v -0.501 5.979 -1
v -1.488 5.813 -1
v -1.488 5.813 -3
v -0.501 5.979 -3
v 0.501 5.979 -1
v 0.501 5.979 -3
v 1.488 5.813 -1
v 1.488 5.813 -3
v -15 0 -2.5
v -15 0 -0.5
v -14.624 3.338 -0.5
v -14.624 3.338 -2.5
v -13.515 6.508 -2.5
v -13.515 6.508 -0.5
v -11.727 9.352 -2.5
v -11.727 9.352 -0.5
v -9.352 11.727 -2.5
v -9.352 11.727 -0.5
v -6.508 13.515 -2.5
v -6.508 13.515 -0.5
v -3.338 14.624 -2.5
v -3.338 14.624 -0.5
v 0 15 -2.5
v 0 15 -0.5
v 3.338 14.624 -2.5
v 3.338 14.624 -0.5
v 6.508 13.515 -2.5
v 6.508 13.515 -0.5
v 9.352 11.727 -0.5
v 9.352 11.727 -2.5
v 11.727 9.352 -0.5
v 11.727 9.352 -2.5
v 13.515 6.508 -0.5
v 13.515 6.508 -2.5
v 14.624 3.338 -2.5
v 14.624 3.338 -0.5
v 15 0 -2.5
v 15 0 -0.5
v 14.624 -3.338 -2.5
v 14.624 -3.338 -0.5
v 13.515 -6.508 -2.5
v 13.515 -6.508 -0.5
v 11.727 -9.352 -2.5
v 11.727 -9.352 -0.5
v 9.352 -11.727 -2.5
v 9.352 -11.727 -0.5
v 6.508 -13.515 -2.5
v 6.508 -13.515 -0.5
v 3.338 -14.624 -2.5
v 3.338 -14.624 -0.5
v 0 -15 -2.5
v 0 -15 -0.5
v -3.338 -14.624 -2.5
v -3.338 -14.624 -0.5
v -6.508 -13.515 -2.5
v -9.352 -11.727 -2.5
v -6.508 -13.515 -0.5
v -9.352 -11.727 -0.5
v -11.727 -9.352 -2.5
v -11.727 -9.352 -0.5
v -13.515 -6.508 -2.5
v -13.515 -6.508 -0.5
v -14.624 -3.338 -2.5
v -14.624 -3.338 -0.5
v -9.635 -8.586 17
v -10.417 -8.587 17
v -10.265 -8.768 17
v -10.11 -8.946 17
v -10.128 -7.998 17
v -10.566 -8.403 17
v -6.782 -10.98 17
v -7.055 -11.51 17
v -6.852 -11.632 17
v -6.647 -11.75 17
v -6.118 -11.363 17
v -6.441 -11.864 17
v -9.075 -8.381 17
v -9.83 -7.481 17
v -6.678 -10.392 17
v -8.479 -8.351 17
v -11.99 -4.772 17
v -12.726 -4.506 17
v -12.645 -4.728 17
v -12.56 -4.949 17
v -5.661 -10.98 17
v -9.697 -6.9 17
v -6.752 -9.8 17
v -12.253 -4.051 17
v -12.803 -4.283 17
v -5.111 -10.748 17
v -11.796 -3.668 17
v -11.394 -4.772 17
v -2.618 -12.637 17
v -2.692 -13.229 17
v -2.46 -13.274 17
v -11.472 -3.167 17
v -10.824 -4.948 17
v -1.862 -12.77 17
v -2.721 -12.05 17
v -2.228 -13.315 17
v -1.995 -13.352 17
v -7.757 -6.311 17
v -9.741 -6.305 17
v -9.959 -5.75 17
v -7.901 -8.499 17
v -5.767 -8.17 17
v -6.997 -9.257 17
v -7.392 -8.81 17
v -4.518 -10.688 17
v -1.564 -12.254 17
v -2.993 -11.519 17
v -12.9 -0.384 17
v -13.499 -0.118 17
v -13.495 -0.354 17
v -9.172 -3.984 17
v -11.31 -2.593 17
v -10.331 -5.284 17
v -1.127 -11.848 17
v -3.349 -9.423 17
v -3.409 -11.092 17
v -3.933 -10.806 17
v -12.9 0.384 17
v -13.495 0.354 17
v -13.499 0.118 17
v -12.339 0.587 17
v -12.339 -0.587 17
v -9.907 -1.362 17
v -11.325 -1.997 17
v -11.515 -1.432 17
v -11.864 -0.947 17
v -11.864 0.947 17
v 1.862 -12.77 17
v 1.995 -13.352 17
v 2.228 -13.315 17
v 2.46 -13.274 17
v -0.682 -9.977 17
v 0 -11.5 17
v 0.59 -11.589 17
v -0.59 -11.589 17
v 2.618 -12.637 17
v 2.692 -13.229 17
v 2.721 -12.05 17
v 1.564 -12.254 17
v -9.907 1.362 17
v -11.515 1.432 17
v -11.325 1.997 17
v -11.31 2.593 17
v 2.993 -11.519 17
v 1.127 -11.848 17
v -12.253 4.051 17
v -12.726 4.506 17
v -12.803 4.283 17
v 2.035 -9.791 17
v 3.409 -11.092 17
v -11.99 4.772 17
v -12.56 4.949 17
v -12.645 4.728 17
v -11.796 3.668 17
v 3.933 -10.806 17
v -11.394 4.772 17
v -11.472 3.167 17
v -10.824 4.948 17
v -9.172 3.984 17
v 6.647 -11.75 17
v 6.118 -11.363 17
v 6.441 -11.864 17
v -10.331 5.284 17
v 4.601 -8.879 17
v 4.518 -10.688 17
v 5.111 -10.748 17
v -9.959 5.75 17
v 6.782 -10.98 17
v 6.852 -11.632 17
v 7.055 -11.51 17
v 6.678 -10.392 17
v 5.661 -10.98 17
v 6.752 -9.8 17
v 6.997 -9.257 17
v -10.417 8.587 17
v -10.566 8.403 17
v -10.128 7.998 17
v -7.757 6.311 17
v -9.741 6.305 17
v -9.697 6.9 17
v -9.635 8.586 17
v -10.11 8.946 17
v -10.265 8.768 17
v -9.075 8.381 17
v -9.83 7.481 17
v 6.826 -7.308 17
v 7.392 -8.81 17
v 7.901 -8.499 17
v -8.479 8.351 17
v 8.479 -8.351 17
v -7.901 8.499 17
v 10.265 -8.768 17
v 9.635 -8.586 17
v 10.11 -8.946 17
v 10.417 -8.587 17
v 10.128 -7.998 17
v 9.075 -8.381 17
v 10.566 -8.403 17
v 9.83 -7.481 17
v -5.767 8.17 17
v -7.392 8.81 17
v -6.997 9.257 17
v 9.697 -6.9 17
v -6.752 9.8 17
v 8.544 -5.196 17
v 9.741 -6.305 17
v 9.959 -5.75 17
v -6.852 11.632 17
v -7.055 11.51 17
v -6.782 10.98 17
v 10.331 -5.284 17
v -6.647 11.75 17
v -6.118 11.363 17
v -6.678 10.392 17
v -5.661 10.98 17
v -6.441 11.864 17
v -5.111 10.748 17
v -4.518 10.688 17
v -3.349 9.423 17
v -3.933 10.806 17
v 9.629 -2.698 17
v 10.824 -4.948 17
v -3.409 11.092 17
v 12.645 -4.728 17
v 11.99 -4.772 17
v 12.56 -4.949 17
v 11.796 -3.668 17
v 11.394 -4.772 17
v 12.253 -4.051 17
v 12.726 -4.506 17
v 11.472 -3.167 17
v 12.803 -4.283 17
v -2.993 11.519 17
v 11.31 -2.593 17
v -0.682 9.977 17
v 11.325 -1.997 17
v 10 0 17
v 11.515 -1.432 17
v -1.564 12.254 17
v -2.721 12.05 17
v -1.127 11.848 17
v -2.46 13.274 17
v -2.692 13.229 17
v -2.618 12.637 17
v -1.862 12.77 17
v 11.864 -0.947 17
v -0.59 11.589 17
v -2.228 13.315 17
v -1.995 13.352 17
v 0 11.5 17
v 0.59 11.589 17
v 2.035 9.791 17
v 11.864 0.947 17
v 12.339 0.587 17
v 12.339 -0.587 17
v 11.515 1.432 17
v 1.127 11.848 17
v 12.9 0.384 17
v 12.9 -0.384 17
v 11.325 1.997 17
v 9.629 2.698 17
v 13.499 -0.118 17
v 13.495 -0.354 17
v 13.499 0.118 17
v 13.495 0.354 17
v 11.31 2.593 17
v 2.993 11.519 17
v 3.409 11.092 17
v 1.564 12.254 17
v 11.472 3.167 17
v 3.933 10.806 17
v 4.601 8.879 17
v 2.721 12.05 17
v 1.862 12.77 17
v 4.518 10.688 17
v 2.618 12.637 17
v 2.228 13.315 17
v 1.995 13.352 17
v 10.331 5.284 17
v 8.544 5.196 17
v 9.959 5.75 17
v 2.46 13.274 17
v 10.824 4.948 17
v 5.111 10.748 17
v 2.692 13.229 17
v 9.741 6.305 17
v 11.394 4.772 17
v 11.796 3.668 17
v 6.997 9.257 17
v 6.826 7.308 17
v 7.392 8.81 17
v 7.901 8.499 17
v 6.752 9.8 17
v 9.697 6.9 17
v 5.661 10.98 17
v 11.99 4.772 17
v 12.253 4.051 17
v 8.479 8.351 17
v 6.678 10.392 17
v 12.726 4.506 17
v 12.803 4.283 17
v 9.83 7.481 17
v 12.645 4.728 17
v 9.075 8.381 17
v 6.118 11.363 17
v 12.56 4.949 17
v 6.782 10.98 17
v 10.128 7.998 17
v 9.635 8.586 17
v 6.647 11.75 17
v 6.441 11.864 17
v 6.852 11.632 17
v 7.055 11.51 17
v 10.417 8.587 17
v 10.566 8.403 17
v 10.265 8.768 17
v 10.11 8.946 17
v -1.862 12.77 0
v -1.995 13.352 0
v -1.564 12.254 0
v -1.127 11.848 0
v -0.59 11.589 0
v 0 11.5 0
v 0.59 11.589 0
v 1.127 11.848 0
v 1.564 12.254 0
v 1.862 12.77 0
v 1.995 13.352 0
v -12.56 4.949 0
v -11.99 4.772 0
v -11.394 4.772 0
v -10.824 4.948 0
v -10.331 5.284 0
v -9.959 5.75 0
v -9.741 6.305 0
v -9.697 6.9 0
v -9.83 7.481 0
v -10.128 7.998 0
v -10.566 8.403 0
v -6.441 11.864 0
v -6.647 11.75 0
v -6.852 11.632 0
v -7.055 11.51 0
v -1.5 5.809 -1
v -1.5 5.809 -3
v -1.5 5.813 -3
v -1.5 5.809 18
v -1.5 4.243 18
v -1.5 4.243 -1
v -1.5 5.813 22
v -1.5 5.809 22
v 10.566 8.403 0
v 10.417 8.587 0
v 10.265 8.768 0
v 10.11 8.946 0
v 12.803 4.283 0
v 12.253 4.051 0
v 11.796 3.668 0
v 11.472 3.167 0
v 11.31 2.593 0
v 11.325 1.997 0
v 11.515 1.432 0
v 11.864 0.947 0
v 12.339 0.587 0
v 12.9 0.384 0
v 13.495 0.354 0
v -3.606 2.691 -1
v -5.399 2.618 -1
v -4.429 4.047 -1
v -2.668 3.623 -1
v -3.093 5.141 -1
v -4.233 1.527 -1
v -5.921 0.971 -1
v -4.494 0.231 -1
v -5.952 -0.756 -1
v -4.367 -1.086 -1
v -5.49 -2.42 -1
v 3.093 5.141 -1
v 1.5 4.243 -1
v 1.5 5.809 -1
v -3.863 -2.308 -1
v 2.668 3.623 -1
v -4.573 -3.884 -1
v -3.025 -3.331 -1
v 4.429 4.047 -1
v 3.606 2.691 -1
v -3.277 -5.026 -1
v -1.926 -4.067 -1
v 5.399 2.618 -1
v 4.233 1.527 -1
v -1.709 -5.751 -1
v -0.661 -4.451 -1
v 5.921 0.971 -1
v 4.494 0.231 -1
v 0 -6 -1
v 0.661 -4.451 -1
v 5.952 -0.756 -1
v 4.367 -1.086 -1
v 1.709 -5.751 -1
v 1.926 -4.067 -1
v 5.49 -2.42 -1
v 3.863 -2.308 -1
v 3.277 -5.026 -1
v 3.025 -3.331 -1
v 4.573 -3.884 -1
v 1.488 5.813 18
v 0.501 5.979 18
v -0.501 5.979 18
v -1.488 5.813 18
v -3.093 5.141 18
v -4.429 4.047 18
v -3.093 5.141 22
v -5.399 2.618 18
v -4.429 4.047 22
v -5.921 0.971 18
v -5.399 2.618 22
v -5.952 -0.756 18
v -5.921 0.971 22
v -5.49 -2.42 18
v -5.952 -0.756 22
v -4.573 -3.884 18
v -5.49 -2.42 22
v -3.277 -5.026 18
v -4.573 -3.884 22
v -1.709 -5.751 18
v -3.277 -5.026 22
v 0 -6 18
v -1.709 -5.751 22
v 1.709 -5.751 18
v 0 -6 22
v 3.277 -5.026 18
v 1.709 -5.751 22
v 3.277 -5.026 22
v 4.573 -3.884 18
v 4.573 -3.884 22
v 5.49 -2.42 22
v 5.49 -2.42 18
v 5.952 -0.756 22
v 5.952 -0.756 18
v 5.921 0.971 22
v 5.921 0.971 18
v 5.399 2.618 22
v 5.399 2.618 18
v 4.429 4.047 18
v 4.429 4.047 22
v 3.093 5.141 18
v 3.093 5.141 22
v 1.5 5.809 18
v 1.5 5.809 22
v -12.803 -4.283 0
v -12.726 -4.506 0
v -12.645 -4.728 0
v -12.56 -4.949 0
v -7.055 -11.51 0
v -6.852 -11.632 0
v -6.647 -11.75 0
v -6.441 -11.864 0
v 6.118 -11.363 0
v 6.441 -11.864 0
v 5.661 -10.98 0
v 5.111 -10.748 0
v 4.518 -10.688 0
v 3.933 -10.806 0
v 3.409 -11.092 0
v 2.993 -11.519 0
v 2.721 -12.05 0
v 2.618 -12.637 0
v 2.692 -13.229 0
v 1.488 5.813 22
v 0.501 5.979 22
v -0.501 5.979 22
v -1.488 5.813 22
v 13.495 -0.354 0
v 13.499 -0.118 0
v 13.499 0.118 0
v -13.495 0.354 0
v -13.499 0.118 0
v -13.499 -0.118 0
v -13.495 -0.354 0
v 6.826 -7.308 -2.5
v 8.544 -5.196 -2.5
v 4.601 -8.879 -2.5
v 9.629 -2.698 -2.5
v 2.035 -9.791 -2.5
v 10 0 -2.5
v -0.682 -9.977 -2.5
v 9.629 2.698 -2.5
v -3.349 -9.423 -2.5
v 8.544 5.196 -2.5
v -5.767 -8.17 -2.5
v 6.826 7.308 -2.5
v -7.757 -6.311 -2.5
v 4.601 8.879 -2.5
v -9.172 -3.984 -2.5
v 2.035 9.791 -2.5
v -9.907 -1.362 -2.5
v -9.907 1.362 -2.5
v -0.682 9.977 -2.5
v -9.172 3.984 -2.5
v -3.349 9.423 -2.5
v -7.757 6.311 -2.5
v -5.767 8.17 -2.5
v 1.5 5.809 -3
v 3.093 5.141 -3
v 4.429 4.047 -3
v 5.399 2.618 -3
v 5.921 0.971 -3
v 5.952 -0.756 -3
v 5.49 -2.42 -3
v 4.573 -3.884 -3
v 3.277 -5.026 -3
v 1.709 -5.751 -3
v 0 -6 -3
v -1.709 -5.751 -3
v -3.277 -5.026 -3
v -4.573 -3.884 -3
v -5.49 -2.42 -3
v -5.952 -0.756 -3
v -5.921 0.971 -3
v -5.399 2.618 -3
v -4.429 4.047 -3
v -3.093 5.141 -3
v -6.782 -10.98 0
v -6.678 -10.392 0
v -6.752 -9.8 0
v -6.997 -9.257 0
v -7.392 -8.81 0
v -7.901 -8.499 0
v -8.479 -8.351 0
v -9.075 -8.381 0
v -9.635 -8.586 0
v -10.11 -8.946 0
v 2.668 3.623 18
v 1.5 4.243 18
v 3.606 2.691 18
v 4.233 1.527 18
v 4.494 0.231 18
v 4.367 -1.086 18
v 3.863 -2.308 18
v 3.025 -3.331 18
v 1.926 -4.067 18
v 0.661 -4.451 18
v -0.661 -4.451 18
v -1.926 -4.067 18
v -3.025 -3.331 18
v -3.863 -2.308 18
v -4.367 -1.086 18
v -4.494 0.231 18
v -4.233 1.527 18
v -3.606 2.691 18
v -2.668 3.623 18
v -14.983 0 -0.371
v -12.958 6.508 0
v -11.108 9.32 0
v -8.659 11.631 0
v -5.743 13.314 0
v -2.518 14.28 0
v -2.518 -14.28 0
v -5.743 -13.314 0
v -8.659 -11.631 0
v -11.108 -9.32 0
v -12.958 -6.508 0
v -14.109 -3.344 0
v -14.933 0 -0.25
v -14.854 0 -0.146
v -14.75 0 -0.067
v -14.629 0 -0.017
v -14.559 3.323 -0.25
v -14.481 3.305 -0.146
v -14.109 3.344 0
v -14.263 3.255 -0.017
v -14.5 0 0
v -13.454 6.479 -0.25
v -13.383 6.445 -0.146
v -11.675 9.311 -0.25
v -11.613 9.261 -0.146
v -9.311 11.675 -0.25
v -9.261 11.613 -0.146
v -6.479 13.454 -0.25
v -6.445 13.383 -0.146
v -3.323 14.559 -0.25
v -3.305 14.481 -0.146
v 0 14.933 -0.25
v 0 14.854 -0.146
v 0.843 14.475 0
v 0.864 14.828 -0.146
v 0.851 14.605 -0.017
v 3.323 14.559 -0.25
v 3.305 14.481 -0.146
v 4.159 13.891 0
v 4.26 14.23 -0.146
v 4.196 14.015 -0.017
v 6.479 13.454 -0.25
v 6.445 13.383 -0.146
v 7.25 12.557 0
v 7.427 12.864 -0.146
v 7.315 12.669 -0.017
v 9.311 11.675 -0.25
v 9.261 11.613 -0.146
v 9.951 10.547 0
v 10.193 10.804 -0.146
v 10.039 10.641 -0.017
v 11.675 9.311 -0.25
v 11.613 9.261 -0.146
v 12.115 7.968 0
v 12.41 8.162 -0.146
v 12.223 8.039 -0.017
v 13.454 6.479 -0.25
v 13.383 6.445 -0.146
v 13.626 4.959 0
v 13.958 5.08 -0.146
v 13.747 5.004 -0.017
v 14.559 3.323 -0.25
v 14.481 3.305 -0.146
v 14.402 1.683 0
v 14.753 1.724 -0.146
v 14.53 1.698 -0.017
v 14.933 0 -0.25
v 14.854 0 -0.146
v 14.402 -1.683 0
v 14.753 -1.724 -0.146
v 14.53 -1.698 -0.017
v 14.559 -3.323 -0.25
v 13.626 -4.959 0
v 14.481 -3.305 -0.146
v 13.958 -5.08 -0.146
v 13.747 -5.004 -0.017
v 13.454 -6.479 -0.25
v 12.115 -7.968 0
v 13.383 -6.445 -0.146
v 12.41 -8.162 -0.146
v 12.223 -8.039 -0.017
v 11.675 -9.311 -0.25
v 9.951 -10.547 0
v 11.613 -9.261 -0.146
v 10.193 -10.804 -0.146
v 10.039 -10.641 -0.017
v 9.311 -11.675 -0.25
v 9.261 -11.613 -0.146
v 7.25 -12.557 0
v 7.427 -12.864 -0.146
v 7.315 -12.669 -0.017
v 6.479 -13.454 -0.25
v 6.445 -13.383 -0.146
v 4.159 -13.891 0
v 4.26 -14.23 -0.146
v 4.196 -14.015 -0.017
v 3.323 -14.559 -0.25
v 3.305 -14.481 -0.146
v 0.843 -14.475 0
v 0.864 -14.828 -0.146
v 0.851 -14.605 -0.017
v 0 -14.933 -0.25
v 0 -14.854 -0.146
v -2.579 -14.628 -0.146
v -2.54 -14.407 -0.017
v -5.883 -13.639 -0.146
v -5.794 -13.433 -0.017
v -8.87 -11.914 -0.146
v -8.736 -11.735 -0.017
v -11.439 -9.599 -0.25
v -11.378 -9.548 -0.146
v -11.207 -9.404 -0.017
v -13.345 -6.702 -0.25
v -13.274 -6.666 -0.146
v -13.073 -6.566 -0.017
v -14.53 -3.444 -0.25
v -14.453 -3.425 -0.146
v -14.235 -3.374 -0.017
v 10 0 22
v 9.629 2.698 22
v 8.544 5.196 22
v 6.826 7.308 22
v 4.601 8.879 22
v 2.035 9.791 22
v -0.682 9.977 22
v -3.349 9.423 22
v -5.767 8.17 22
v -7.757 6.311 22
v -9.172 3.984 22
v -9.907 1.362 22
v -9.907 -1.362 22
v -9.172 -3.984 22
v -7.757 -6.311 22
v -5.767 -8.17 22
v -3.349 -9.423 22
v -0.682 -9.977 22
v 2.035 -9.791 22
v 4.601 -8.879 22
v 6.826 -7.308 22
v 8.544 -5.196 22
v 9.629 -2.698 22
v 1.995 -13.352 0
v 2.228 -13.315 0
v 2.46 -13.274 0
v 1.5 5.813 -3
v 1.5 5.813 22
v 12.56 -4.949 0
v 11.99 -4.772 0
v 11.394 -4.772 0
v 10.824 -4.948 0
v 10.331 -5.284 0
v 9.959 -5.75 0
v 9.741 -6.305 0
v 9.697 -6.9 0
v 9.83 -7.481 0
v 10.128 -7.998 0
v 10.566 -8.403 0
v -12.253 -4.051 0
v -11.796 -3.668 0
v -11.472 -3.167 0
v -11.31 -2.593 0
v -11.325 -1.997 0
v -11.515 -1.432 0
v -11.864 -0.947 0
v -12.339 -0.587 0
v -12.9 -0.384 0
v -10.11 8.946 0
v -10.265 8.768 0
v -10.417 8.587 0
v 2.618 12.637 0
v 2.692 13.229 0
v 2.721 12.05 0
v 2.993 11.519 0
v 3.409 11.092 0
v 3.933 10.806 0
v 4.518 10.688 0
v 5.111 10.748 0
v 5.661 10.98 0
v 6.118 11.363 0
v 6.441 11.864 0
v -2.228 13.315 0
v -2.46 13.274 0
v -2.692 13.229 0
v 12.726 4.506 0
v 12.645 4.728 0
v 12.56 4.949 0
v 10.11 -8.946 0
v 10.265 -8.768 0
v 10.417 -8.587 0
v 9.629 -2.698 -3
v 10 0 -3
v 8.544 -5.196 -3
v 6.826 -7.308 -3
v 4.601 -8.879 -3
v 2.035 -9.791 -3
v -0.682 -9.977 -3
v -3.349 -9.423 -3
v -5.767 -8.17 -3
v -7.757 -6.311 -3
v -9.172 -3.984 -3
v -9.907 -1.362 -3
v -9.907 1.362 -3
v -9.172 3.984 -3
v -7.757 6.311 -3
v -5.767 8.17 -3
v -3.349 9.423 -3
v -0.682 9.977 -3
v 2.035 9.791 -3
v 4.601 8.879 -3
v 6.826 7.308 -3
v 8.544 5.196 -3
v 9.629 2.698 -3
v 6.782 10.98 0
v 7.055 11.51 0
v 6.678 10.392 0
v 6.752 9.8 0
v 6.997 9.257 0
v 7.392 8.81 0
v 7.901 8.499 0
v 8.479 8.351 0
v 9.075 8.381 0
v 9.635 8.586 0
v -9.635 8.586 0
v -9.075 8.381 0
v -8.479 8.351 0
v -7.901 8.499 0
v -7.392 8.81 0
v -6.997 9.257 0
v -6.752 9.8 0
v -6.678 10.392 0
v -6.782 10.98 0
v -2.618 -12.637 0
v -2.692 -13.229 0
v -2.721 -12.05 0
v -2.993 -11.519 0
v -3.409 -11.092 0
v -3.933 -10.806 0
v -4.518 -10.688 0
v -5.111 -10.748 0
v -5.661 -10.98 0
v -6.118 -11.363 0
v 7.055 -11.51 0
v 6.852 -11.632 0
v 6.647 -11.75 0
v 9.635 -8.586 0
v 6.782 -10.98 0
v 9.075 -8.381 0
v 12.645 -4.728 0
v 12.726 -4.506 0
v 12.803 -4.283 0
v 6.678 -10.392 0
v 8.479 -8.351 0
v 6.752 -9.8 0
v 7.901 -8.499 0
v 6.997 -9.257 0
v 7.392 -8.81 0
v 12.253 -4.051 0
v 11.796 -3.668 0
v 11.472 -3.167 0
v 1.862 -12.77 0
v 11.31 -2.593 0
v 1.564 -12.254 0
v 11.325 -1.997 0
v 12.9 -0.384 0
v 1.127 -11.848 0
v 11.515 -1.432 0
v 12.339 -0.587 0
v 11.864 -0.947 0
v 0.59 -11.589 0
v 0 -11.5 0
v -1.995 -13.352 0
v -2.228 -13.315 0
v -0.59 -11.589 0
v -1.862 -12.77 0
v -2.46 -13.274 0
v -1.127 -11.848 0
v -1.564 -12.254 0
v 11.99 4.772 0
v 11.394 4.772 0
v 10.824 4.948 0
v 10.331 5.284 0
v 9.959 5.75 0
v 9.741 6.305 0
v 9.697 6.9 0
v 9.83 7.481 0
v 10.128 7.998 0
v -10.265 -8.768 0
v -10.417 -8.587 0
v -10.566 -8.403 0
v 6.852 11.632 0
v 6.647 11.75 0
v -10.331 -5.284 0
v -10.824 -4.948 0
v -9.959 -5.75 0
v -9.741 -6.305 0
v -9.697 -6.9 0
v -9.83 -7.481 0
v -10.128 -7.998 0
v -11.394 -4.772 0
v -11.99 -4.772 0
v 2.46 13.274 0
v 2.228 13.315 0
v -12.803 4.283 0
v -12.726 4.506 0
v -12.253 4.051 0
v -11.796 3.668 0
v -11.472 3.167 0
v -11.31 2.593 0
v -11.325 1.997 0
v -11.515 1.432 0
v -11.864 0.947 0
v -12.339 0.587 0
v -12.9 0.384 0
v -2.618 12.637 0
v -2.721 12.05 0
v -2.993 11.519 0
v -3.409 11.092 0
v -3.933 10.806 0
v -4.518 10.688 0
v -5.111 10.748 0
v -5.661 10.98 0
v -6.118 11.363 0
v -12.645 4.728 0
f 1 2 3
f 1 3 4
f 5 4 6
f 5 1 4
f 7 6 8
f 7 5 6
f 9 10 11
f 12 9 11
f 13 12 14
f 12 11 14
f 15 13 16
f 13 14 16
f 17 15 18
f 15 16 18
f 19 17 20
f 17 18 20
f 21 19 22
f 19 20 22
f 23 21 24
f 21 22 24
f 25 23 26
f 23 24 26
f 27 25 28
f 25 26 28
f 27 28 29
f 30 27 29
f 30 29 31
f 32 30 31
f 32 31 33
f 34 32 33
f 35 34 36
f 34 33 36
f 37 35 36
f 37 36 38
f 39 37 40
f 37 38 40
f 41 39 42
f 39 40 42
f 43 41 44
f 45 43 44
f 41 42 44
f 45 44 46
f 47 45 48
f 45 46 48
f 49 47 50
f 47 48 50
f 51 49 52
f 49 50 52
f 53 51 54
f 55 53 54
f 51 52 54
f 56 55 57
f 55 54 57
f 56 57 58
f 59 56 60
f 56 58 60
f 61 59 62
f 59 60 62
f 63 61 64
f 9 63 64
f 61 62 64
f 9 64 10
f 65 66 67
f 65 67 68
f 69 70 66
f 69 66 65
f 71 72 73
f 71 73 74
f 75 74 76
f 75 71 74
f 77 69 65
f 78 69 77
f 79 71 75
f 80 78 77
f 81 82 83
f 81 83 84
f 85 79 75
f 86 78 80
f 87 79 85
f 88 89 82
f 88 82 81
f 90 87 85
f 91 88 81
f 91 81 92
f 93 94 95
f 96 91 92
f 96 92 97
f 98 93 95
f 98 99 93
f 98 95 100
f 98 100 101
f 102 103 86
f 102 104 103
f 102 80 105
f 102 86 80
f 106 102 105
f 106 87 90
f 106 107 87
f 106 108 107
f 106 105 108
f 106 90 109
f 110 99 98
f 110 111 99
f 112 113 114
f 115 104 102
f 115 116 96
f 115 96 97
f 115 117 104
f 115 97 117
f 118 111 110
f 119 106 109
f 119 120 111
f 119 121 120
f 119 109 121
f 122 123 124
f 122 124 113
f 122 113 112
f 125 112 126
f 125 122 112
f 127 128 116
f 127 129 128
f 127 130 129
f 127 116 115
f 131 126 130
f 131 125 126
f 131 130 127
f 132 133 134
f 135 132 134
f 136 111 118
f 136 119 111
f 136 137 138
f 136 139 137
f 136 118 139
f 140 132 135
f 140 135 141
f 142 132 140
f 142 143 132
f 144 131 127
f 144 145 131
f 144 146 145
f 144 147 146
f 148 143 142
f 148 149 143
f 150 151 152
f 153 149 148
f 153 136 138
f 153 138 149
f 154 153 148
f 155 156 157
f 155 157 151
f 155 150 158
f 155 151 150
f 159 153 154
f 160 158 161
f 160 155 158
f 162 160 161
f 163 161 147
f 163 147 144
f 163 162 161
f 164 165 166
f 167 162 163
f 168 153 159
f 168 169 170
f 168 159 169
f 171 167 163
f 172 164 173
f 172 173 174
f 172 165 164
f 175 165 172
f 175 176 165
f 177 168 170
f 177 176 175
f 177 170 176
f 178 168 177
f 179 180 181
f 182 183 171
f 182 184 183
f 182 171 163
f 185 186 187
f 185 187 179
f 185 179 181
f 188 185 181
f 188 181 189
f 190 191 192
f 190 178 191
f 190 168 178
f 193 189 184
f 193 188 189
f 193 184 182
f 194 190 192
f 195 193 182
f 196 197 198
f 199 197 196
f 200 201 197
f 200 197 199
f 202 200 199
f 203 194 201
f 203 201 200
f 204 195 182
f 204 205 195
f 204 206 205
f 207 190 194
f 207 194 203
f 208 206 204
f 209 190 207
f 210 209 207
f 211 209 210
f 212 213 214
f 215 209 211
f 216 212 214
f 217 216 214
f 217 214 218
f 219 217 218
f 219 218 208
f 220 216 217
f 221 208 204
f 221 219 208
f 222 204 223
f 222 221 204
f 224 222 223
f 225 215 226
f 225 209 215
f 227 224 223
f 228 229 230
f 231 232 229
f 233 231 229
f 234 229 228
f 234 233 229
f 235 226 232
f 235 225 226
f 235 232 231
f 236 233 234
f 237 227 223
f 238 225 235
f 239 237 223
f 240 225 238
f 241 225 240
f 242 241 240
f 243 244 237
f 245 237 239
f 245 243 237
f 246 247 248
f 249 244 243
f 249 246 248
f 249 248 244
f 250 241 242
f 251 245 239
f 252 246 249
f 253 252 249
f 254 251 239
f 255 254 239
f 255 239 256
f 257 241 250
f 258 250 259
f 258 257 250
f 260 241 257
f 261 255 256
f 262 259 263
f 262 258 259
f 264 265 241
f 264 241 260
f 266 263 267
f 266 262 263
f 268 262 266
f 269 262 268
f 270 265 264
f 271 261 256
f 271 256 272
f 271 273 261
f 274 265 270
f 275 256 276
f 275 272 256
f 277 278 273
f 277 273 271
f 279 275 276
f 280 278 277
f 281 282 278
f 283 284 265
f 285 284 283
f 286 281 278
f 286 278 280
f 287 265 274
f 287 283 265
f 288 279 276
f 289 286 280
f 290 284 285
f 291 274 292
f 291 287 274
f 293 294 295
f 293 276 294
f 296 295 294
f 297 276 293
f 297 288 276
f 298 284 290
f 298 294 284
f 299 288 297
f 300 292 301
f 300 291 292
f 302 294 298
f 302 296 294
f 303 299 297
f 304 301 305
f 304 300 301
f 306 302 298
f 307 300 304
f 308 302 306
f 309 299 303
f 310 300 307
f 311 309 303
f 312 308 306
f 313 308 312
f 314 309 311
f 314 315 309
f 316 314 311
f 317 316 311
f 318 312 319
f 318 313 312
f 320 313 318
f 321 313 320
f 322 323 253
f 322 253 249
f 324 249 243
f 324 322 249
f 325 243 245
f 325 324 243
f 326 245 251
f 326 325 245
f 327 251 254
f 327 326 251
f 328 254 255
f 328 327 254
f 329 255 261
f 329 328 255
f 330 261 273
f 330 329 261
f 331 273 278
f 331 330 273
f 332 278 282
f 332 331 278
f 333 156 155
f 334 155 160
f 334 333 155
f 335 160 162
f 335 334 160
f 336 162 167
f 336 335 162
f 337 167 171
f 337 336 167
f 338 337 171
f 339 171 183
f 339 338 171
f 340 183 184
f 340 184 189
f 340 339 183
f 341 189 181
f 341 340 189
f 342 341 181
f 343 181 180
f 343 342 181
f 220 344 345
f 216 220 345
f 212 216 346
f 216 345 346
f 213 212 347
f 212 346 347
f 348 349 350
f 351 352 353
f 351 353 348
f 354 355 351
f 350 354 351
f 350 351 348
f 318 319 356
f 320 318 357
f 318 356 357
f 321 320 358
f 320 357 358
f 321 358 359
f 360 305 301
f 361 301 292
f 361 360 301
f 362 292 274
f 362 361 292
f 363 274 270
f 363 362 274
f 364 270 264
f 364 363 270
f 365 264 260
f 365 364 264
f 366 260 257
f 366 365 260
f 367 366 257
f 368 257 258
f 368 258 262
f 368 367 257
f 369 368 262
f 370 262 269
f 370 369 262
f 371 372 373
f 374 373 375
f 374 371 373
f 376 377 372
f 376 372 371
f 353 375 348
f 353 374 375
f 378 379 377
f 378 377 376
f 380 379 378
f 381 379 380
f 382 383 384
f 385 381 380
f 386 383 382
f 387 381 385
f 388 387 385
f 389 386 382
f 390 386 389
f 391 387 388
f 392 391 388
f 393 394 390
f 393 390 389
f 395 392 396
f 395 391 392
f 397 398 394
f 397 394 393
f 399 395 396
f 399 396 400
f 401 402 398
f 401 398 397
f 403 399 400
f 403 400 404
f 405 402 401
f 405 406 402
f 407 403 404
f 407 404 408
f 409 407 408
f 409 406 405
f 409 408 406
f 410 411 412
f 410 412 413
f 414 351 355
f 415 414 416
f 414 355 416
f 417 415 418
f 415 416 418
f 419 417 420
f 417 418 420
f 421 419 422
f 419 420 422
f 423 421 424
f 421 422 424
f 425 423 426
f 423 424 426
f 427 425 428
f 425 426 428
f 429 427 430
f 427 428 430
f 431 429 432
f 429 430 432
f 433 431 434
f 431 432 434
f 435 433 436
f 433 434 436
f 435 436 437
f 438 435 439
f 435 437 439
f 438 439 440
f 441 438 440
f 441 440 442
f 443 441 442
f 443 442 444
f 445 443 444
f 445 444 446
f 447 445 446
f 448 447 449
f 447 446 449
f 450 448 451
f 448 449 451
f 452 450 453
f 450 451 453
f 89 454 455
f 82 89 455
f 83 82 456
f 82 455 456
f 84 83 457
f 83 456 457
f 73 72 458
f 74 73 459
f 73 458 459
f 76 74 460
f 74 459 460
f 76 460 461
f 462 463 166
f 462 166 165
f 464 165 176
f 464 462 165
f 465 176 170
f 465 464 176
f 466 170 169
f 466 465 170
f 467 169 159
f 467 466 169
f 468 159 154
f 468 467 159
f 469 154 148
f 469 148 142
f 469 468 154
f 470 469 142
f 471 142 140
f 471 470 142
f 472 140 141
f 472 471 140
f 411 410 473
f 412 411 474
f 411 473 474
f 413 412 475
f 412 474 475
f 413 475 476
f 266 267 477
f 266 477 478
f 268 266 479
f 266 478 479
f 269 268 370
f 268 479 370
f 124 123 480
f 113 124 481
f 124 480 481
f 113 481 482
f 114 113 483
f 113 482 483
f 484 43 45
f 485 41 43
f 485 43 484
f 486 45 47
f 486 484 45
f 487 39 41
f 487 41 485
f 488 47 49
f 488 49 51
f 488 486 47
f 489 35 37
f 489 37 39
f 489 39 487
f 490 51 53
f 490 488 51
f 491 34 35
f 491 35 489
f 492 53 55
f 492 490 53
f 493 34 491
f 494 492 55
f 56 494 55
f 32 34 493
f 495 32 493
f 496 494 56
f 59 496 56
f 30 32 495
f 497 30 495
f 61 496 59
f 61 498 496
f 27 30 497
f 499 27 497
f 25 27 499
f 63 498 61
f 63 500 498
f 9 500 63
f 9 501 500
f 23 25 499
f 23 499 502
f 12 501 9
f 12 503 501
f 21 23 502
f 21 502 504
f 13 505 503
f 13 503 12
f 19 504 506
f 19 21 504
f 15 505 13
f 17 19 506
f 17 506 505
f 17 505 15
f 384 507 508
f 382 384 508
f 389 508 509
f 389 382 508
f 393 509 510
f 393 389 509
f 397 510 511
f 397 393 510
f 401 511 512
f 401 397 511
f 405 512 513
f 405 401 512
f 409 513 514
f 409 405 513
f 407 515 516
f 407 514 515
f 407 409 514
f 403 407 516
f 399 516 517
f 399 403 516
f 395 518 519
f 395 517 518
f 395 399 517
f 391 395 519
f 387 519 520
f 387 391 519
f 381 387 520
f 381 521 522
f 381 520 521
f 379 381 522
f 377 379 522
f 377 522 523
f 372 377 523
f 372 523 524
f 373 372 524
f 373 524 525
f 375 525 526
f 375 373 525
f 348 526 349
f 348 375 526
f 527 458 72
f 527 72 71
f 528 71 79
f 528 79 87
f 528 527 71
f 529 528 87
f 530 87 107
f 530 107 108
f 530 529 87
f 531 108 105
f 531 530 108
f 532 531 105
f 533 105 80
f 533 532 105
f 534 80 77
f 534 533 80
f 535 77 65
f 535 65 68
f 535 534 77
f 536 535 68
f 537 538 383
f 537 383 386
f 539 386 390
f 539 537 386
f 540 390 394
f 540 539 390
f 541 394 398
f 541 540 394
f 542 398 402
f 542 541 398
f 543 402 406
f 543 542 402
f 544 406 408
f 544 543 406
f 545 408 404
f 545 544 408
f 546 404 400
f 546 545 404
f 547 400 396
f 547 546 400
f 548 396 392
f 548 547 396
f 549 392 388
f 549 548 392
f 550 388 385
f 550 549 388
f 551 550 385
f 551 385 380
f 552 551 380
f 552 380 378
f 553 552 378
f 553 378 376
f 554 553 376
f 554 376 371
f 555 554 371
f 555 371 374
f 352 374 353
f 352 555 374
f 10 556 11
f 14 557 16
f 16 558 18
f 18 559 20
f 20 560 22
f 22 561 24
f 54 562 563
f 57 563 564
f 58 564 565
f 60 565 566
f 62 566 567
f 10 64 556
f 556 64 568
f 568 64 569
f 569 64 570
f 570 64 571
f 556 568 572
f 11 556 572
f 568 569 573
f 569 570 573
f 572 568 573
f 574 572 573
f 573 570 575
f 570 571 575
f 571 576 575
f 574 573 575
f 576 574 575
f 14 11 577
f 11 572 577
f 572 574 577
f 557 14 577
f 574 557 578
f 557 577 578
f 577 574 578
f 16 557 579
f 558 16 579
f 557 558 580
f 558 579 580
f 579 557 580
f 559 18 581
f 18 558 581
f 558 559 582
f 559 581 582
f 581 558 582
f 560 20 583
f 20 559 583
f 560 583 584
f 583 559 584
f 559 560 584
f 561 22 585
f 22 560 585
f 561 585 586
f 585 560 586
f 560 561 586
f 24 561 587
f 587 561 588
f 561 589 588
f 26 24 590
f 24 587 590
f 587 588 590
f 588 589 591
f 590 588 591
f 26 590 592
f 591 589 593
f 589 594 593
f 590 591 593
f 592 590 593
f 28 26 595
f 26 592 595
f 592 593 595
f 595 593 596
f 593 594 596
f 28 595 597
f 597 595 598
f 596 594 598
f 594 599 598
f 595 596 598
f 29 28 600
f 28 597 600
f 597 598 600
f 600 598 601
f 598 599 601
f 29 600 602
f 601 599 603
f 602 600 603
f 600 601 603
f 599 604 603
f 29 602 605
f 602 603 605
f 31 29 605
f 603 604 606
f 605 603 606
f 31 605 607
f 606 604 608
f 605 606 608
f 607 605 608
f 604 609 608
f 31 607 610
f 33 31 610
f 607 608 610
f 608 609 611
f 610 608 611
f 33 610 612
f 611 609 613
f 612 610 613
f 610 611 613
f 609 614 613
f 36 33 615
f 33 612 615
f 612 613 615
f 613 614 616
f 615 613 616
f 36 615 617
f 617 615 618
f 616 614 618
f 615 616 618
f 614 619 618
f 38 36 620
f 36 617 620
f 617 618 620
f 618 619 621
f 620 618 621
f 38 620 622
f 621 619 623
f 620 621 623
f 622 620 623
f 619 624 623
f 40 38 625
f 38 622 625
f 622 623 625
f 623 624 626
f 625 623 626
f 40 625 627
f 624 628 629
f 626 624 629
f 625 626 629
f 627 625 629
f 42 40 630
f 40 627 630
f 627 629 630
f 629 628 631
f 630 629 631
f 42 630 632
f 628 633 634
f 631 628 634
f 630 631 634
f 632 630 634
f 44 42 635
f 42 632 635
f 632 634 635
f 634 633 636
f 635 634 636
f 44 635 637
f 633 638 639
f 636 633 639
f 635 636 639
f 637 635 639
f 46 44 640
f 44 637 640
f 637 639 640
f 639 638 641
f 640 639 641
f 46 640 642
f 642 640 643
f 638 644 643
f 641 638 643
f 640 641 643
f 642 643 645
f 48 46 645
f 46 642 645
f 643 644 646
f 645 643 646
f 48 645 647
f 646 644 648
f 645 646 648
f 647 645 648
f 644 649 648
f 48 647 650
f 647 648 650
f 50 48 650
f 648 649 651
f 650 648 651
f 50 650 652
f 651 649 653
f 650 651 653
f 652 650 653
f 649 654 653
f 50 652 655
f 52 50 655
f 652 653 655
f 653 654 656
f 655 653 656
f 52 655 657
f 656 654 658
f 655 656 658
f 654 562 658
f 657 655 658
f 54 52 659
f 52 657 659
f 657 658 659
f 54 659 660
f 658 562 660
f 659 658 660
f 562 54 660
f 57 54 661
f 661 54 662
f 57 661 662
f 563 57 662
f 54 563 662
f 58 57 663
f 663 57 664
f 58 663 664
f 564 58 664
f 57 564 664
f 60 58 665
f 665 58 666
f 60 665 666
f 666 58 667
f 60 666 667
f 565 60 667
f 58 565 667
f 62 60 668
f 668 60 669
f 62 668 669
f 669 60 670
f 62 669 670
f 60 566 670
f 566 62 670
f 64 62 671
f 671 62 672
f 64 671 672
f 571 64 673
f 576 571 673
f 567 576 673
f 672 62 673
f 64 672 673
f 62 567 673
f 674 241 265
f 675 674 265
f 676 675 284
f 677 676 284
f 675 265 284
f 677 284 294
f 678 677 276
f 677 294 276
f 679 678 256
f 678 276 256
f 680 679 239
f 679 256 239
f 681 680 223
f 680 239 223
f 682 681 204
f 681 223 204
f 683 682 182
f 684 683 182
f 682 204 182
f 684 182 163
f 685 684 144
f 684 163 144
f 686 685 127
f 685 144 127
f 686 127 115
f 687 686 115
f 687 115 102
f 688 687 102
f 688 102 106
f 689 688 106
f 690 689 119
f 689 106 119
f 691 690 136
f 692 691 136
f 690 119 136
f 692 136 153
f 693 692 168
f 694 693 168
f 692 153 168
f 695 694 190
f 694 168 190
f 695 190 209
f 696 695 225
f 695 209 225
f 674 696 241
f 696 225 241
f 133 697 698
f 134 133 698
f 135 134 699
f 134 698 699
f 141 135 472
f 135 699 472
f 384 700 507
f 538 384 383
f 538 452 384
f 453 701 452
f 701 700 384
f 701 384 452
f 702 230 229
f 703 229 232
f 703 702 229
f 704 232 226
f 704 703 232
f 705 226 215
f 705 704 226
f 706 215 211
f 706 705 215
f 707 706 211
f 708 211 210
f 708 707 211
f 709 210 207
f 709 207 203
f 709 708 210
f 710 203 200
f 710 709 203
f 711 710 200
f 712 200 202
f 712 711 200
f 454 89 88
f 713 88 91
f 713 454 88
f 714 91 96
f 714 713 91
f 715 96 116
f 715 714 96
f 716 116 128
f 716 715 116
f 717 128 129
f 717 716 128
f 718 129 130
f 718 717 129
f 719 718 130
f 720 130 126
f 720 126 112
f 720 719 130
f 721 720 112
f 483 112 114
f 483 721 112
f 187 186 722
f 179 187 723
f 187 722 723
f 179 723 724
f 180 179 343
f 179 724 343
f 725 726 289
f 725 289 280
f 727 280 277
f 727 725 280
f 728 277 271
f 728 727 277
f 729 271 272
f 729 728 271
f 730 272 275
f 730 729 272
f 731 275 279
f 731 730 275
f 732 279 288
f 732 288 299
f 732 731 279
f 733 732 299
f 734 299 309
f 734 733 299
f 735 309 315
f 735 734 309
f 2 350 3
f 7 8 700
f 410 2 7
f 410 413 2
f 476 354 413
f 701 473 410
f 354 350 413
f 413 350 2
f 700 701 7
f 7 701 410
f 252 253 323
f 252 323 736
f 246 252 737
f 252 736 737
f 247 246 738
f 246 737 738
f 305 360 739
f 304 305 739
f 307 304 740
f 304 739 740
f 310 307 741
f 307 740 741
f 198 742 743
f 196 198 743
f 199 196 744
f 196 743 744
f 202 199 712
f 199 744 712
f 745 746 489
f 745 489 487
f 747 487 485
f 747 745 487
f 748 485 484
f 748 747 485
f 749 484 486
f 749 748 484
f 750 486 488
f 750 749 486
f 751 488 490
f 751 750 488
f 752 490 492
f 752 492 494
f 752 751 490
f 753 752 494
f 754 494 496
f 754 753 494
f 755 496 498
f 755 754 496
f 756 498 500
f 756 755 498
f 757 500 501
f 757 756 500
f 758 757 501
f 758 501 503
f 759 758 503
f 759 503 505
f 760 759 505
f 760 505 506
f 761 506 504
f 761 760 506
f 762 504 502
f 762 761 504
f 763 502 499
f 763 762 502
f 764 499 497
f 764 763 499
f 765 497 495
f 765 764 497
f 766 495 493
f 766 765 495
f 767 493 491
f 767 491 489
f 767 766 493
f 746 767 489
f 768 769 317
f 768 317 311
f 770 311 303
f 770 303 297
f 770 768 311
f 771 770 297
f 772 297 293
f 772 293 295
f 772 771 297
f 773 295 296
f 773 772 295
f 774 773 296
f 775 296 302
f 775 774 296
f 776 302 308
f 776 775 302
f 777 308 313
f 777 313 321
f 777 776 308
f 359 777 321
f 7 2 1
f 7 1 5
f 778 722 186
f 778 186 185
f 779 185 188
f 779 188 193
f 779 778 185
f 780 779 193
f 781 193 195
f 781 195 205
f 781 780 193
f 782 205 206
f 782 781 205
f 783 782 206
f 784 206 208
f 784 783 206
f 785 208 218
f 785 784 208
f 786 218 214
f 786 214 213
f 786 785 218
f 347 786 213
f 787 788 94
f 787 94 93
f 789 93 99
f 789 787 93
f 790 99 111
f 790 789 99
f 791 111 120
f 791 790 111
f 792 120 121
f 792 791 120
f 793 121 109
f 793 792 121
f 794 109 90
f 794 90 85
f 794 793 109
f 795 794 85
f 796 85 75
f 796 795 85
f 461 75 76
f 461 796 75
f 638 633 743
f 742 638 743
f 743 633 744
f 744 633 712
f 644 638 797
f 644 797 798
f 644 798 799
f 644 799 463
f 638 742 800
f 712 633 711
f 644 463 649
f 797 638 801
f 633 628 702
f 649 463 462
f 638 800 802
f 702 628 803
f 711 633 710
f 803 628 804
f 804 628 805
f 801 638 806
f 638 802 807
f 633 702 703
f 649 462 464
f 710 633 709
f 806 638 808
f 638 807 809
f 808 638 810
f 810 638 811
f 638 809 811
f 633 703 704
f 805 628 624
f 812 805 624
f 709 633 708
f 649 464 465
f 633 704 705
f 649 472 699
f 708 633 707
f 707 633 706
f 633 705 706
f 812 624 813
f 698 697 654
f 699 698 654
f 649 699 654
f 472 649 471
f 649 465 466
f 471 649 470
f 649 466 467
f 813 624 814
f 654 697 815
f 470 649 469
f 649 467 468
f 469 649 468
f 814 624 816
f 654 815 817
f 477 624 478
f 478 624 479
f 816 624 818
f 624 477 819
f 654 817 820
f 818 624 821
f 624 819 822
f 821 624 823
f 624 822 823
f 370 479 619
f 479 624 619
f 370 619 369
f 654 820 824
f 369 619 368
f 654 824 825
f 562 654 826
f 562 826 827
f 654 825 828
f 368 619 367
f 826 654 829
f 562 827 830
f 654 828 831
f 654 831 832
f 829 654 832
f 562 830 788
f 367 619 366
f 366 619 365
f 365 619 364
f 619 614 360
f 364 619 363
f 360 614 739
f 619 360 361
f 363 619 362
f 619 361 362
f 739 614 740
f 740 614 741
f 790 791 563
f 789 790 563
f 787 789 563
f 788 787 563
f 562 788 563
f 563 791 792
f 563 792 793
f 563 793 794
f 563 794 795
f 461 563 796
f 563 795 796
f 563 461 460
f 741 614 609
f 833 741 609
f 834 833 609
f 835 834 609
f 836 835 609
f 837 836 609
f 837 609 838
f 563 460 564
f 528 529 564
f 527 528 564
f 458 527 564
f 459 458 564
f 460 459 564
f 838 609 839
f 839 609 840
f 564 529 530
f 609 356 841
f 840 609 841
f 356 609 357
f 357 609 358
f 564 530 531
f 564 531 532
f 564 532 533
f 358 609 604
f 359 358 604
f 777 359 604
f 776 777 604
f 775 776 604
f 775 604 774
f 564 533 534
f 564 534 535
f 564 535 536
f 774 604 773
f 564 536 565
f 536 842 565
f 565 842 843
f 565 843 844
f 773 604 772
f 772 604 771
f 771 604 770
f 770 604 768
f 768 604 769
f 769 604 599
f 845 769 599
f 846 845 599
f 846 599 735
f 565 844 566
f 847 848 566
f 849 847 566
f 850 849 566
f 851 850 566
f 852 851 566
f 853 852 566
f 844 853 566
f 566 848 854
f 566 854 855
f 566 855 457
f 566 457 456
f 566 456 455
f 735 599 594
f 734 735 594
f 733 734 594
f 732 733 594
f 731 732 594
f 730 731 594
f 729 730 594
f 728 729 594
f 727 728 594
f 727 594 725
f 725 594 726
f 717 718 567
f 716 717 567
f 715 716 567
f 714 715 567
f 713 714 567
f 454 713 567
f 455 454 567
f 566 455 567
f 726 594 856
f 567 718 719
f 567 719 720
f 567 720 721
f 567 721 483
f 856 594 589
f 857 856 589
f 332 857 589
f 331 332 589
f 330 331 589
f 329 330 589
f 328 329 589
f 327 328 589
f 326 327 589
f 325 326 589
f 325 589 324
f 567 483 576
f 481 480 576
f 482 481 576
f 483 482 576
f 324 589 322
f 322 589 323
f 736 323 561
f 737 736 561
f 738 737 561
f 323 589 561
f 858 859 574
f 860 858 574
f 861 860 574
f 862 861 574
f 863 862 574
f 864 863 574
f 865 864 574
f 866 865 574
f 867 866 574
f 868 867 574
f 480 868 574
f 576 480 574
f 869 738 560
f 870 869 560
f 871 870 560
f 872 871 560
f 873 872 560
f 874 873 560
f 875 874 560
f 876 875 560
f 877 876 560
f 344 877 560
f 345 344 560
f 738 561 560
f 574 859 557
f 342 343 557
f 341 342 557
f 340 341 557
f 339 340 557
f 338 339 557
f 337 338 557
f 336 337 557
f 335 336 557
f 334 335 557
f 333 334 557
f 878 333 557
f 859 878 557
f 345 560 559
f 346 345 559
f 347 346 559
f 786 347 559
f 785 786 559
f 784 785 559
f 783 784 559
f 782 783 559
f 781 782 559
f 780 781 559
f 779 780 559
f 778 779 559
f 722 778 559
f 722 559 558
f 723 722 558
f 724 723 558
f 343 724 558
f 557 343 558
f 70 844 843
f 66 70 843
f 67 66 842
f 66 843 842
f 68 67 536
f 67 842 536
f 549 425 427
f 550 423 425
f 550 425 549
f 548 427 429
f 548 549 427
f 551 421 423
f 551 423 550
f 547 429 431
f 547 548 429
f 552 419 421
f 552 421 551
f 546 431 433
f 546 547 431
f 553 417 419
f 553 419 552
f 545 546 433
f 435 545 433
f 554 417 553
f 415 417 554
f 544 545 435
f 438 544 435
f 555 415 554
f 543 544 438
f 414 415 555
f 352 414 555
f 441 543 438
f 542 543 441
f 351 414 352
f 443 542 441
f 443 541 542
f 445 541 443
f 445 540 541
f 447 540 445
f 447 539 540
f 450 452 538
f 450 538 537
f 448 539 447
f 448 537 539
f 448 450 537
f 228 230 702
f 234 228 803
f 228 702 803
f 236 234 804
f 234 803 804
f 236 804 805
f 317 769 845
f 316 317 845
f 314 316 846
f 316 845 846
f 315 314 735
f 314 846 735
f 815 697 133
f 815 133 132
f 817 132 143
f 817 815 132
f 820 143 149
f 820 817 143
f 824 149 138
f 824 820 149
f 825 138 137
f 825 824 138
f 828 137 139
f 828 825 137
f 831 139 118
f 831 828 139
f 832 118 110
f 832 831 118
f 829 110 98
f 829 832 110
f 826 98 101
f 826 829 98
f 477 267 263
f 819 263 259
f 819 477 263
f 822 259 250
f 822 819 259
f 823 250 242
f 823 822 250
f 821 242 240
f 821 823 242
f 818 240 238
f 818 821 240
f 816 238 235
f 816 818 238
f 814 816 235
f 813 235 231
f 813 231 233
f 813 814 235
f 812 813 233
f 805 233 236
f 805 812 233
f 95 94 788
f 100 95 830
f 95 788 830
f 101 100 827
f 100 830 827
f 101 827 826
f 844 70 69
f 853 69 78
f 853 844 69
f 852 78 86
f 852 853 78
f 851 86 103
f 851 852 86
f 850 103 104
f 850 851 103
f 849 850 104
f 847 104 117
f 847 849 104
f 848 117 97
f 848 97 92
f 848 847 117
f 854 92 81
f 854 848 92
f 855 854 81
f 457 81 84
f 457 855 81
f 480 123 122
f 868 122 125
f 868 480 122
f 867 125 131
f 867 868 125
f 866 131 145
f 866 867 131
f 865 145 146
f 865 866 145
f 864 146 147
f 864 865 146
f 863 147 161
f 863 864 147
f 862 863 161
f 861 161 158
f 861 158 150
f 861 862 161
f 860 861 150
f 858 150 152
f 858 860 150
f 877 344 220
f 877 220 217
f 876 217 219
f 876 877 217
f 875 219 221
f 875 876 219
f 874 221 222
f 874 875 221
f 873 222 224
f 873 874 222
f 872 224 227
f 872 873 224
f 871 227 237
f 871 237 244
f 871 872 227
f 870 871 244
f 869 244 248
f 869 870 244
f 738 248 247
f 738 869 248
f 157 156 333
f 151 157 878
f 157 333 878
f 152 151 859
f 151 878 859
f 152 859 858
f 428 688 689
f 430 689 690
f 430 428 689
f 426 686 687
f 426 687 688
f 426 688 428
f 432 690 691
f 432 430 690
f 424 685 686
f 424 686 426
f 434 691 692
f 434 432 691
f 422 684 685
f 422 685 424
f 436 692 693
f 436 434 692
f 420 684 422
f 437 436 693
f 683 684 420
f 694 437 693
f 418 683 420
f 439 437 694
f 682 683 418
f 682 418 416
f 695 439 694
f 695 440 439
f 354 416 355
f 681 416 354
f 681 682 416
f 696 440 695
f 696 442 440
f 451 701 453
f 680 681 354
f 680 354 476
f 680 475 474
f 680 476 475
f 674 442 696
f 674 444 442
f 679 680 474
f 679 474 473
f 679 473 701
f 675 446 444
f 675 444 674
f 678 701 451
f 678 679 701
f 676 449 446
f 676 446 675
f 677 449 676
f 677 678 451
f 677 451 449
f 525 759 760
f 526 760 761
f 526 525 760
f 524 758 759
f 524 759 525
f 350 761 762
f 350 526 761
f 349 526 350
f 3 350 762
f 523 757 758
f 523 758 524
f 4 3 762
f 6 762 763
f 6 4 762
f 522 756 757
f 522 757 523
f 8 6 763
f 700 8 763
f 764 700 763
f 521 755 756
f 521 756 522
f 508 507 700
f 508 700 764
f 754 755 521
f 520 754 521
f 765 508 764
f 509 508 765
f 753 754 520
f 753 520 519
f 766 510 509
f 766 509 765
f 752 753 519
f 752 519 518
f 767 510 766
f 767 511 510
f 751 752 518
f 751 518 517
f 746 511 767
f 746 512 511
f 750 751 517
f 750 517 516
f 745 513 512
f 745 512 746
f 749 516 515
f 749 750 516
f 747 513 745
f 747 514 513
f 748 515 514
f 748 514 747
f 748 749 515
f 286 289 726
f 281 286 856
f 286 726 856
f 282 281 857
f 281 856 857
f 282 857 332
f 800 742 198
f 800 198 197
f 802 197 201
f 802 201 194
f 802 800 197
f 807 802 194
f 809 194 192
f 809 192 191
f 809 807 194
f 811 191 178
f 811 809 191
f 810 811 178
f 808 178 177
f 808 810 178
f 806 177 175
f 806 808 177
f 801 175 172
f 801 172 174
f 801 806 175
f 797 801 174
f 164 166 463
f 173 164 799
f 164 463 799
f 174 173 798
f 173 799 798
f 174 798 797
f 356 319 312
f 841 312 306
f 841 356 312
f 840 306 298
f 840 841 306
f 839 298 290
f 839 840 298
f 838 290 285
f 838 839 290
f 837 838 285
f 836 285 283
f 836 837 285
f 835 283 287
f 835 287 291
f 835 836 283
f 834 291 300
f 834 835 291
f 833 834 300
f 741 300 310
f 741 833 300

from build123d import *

# Parameters (mm, degrees)
CROQUIS1_R              = 13.5
SALIENTE_EXTRUIR1_DEPTH = 17
CORTAR_EXTRUIR5_START   = -26
CORTAR_EXTRUIR5_DEPTH   = 26
CROQUIS8_R              = 10
SALIENTE_EXTRUIR2_DEPTH = 5
CROQUIS9_R              = 4.5
CORTAR_EXTRUIR6_DEPTH   = 45
CROQUIS10_R             = 6
CORTAR_EXTRUIR8_DEPTH   = 4
CROQUIS12_R             = 15
SALIENTE_EXTRUIR4_DEPTH = 2.5
CORTAR_EXTRUIR9_START   = -25
CROQUIS13_R             = 4.5
CORTAR_EXTRUIR9_DEPTH   = 25
SALIENTE_EXTRUIR5_START = 0.5
CROQUIS14_R             = 10
SALIENTE_EXTRUIR5_DEPTH = 0.5
CORTAR_EXTRUIR10_START  = -2
CROQUIS15_R             = 6
CORTAR_EXTRUIR10_DEPTH  = 2
CORTAR_EXTRUIR12_DEPTH  = 50
REDONDEO1_R             = 0.5


with BuildPart() as part:
    # Croquis1 → Saliente-Extruir1 (new body)
    with BuildSketch(Plane.XY):
        Circle(CROQUIS1_R)
    extrude(amount=SALIENTE_EXTRUIR1_DEPTH)

    # Croquis2 → Cortar-Extruir5 (cut)
    with BuildSketch(Plane.XY.offset(17).offset(CORTAR_EXTRUIR5_START)):
        with BuildLine():
            ThreePointArc((-6.44082437, 11.864475607), (-3.933231648, 10.806465139), (-2.692380198, 13.228797711))
            ThreePointArc((-2.692380198, 13.228797711), (-4.617271935, 12.685850381), (-6.44082437, 11.864475607))
        make_face()
        with BuildLine():
            ThreePointArc((-10.11028478, 8.946068504), (-7.392057511, 8.809511096), (-7.054525094, 11.510155329))
            ThreePointArc((-7.054525094, 11.510155329), (-8.677632731, 10.341599982), (-10.11028478, 8.946068504))
        make_face()
        with BuildLine():
            ThreePointArc((-12.560295633, 4.948633509), (-9.959292144, 5.75), (-10.565790149, 8.403218343))
            ThreePointArc((-10.565790149, 8.403218343), (-11.691342951, 6.75), (-12.560295633, 4.948633509))
        make_face()
        with BuildLine():
            ThreePointArc((1.994505484, 13.351851852), (0, 13.5), (-1.994505484, 13.351851852))
            ThreePointArc((-1.994505484, 13.351851852), (0, 11.5), (1.994505484, 13.351851852))
        make_face()
        with BuildLine():
            ThreePointArc((6.44082437, 11.864475607), (4.617271935, 12.685850381), (2.692380198, 13.228797711))
            ThreePointArc((2.692380198, 13.228797711), (3.933231648, 10.806465139), (6.44082437, 11.864475607))
        make_face()
        with BuildLine():
            ThreePointArc((10.11028478, 8.946068504), (8.677632731, 10.341599982), (7.054525094, 11.510155329))
            ThreePointArc((7.054525094, 11.510155329), (7.392057511, 8.809511096), (10.11028478, 8.946068504))
        make_face()
        with BuildLine():
            ThreePointArc((12.560295633, 4.948633509), (11.691342951, 6.75), (10.565790149, 8.403218343))
            ThreePointArc((10.565790149, 8.403218343), (9.959292144, 5.75), (12.560295633, 4.948633509))
        make_face()
        with BuildLine():
            ThreePointArc((13.495349463, 0.354320278), (13.294904666, 2.344250399), (12.802664978, 4.282729207))
            ThreePointArc((12.802664978, 4.282729207), (11.32528916, 1.996954043), (13.495349463, 0.354320278))
        make_face()
        with BuildLine():
            ThreePointArc((12.802664978, -4.282729207), (13.294904666, -2.344250399), (13.495349463, -0.354320278))
            ThreePointArc((13.495349463, -0.354320278), (11.32528916, -1.996954043), (12.802664978, -4.282729207))
        make_face()
        with BuildLine():
            ThreePointArc((10.565790149, -8.403218343), (11.691342951, -6.75), (12.560295633, -4.948633509))
            ThreePointArc((12.560295633, -4.948633509), (9.959292144, -5.75), (10.565790149, -8.403218343))
        make_face()
        with BuildLine():
            ThreePointArc((7.054525094, -11.510155329), (8.677632731, -10.341599982), (10.11028478, -8.946068504))
            ThreePointArc((10.11028478, -8.946068504), (7.392057511, -8.809511096), (7.054525094, -11.510155329))
        make_face()
        with BuildLine():
            ThreePointArc((2.692380198, -13.228797711), (4.617271935, -12.685850381), (6.44082437, -11.864475607))
            ThreePointArc((6.44082437, -11.864475607), (3.933231648, -10.806465139), (2.692380198, -13.228797711))
        make_face()
        with BuildLine():
            ThreePointArc((1.994505484, -13.351851852), (0, -11.5), (-1.994505484, -13.351851852))
            ThreePointArc((-1.994505484, -13.351851852), (0, -13.5), (1.994505484, -13.351851852))
        make_face()
        with BuildLine():
            ThreePointArc((-2.692380198, -13.228797711), (-3.933231648, -10.806465139), (-6.44082437, -11.864475607))
            ThreePointArc((-6.44082437, -11.864475607), (-4.617271935, -12.685850381), (-2.692380198, -13.228797711))
        make_face()
        with BuildLine():
            ThreePointArc((-7.054525094, -11.510155329), (-7.392057511, -8.809511096), (-10.11028478, -8.946068504))
            ThreePointArc((-10.11028478, -8.946068504), (-8.677632731, -10.341599982), (-7.054525094, -11.510155329))
        make_face()
        with BuildLine():
            ThreePointArc((-10.565790149, -8.403218343), (-9.959292144, -5.75), (-12.560295633, -4.948633509))
            ThreePointArc((-12.560295633, -4.948633509), (-11.691342951, -6.75), (-10.565790149, -8.403218343))
        make_face()
        with BuildLine():
            ThreePointArc((-12.802664978, -4.282729207), (-11.32528916, -1.996954043), (-13.495349463, -0.354320278))
            ThreePointArc((-13.495349463, -0.354320278), (-13.294904666, -2.344250399), (-12.802664978, -4.282729207))
        make_face()
        with BuildLine():
            ThreePointArc((-13.495349463, 0.354320278), (-11.32528916, 1.996954043), (-12.802664978, 4.282729207))
            ThreePointArc((-12.802664978, 4.282729207), (-13.294904666, 2.344250399), (-13.495349463, 0.354320278))
        make_face()
    extrude(amount=CORTAR_EXTRUIR5_DEPTH, mode=Mode.SUBTRACT)

    # Croquis8 → Saliente-Extruir2 (add)
    with BuildSketch(Plane.XY.offset(17)):
        Circle(CROQUIS8_R)
    extrude(amount=SALIENTE_EXTRUIR2_DEPTH)

    # Croquis9 → Cortar-Extruir6 (cut)
    with BuildSketch(Plane.XY.offset(22)):
        Circle(CROQUIS9_R)
    extrude(amount=-CORTAR_EXTRUIR6_DEPTH, mode=Mode.SUBTRACT)

    # Croquis10 → Cortar-Extruir8 (cut)
    with BuildSketch(Plane.XY.offset(22)):
        Circle(CROQUIS10_R)
    extrude(amount=-CORTAR_EXTRUIR8_DEPTH, mode=Mode.SUBTRACT)

    # Croquis12 → Saliente-Extruir4 (add)
    with BuildSketch(Plane(origin=(0, 0, 0), x_dir=(-1, 0, 0), z_dir=(0, 0, -1))):
        Circle(CROQUIS12_R)
    extrude(amount=SALIENTE_EXTRUIR4_DEPTH)

    # Croquis13 → Cortar-Extruir9 (cut)
    with BuildSketch(Plane(origin=(0, 0, -2.5), x_dir=(-1, 0, 0), z_dir=(0, 0, -1)).offset(CORTAR_EXTRUIR9_START)):
        with Locations(Location((0, 0, 0), (0, 0, 180))):
            Circle(CROQUIS13_R)
    extrude(amount=CORTAR_EXTRUIR9_DEPTH, mode=Mode.SUBTRACT)

    # Croquis14 → Saliente-Extruir5 (add)
    with BuildSketch(Plane(origin=(0, 0, -2.5), x_dir=(-1, 0, 0), z_dir=(0, 0, -1)).offset(SALIENTE_EXTRUIR5_START)):
        with Locations(Location((0, 0, 0), (0, 0, 180))):
            Circle(CROQUIS14_R)
    extrude(amount=-SALIENTE_EXTRUIR5_DEPTH)

    # Croquis15 → Cortar-Extruir10 (cut)
    with BuildSketch(Plane(origin=(0, 0, -3), x_dir=(-1, 0, 0), z_dir=(0, 0, -1)).offset(CORTAR_EXTRUIR10_START)):
        with Locations(Location((0, 0, 0), (0, 0, 180))):
            Circle(CROQUIS15_R)
    extrude(amount=CORTAR_EXTRUIR10_DEPTH, mode=Mode.SUBTRACT)

    # Croquis16 → Cortar-Extruir12 (cut)
    with BuildSketch(Plane.XY.offset(22)):
        with BuildLine():
            Line((-1.5, 4.242640687), (-1.5, 5.812640687))
            Line((-1.5, 5.812640687), (1.5, 5.812640687))
            Line((1.5, 5.812640687), (1.5, 4.242640687))
            ThreePointArc((1.5, 4.242640687), (0, 4.5), (-1.5, 4.242640687))
        make_face()
    extrude(amount=-CORTAR_EXTRUIR12_DEPTH, mode=Mode.SUBTRACT)

    # Redondeo1
    redondeo1_edges = [part.edges().sort_by_distance(p)[0] for p in [
        (15, 0, 0),
    ]]
    fillet(redondeo1_edges, radius=REDONDEO1_R)


solid = part.part
